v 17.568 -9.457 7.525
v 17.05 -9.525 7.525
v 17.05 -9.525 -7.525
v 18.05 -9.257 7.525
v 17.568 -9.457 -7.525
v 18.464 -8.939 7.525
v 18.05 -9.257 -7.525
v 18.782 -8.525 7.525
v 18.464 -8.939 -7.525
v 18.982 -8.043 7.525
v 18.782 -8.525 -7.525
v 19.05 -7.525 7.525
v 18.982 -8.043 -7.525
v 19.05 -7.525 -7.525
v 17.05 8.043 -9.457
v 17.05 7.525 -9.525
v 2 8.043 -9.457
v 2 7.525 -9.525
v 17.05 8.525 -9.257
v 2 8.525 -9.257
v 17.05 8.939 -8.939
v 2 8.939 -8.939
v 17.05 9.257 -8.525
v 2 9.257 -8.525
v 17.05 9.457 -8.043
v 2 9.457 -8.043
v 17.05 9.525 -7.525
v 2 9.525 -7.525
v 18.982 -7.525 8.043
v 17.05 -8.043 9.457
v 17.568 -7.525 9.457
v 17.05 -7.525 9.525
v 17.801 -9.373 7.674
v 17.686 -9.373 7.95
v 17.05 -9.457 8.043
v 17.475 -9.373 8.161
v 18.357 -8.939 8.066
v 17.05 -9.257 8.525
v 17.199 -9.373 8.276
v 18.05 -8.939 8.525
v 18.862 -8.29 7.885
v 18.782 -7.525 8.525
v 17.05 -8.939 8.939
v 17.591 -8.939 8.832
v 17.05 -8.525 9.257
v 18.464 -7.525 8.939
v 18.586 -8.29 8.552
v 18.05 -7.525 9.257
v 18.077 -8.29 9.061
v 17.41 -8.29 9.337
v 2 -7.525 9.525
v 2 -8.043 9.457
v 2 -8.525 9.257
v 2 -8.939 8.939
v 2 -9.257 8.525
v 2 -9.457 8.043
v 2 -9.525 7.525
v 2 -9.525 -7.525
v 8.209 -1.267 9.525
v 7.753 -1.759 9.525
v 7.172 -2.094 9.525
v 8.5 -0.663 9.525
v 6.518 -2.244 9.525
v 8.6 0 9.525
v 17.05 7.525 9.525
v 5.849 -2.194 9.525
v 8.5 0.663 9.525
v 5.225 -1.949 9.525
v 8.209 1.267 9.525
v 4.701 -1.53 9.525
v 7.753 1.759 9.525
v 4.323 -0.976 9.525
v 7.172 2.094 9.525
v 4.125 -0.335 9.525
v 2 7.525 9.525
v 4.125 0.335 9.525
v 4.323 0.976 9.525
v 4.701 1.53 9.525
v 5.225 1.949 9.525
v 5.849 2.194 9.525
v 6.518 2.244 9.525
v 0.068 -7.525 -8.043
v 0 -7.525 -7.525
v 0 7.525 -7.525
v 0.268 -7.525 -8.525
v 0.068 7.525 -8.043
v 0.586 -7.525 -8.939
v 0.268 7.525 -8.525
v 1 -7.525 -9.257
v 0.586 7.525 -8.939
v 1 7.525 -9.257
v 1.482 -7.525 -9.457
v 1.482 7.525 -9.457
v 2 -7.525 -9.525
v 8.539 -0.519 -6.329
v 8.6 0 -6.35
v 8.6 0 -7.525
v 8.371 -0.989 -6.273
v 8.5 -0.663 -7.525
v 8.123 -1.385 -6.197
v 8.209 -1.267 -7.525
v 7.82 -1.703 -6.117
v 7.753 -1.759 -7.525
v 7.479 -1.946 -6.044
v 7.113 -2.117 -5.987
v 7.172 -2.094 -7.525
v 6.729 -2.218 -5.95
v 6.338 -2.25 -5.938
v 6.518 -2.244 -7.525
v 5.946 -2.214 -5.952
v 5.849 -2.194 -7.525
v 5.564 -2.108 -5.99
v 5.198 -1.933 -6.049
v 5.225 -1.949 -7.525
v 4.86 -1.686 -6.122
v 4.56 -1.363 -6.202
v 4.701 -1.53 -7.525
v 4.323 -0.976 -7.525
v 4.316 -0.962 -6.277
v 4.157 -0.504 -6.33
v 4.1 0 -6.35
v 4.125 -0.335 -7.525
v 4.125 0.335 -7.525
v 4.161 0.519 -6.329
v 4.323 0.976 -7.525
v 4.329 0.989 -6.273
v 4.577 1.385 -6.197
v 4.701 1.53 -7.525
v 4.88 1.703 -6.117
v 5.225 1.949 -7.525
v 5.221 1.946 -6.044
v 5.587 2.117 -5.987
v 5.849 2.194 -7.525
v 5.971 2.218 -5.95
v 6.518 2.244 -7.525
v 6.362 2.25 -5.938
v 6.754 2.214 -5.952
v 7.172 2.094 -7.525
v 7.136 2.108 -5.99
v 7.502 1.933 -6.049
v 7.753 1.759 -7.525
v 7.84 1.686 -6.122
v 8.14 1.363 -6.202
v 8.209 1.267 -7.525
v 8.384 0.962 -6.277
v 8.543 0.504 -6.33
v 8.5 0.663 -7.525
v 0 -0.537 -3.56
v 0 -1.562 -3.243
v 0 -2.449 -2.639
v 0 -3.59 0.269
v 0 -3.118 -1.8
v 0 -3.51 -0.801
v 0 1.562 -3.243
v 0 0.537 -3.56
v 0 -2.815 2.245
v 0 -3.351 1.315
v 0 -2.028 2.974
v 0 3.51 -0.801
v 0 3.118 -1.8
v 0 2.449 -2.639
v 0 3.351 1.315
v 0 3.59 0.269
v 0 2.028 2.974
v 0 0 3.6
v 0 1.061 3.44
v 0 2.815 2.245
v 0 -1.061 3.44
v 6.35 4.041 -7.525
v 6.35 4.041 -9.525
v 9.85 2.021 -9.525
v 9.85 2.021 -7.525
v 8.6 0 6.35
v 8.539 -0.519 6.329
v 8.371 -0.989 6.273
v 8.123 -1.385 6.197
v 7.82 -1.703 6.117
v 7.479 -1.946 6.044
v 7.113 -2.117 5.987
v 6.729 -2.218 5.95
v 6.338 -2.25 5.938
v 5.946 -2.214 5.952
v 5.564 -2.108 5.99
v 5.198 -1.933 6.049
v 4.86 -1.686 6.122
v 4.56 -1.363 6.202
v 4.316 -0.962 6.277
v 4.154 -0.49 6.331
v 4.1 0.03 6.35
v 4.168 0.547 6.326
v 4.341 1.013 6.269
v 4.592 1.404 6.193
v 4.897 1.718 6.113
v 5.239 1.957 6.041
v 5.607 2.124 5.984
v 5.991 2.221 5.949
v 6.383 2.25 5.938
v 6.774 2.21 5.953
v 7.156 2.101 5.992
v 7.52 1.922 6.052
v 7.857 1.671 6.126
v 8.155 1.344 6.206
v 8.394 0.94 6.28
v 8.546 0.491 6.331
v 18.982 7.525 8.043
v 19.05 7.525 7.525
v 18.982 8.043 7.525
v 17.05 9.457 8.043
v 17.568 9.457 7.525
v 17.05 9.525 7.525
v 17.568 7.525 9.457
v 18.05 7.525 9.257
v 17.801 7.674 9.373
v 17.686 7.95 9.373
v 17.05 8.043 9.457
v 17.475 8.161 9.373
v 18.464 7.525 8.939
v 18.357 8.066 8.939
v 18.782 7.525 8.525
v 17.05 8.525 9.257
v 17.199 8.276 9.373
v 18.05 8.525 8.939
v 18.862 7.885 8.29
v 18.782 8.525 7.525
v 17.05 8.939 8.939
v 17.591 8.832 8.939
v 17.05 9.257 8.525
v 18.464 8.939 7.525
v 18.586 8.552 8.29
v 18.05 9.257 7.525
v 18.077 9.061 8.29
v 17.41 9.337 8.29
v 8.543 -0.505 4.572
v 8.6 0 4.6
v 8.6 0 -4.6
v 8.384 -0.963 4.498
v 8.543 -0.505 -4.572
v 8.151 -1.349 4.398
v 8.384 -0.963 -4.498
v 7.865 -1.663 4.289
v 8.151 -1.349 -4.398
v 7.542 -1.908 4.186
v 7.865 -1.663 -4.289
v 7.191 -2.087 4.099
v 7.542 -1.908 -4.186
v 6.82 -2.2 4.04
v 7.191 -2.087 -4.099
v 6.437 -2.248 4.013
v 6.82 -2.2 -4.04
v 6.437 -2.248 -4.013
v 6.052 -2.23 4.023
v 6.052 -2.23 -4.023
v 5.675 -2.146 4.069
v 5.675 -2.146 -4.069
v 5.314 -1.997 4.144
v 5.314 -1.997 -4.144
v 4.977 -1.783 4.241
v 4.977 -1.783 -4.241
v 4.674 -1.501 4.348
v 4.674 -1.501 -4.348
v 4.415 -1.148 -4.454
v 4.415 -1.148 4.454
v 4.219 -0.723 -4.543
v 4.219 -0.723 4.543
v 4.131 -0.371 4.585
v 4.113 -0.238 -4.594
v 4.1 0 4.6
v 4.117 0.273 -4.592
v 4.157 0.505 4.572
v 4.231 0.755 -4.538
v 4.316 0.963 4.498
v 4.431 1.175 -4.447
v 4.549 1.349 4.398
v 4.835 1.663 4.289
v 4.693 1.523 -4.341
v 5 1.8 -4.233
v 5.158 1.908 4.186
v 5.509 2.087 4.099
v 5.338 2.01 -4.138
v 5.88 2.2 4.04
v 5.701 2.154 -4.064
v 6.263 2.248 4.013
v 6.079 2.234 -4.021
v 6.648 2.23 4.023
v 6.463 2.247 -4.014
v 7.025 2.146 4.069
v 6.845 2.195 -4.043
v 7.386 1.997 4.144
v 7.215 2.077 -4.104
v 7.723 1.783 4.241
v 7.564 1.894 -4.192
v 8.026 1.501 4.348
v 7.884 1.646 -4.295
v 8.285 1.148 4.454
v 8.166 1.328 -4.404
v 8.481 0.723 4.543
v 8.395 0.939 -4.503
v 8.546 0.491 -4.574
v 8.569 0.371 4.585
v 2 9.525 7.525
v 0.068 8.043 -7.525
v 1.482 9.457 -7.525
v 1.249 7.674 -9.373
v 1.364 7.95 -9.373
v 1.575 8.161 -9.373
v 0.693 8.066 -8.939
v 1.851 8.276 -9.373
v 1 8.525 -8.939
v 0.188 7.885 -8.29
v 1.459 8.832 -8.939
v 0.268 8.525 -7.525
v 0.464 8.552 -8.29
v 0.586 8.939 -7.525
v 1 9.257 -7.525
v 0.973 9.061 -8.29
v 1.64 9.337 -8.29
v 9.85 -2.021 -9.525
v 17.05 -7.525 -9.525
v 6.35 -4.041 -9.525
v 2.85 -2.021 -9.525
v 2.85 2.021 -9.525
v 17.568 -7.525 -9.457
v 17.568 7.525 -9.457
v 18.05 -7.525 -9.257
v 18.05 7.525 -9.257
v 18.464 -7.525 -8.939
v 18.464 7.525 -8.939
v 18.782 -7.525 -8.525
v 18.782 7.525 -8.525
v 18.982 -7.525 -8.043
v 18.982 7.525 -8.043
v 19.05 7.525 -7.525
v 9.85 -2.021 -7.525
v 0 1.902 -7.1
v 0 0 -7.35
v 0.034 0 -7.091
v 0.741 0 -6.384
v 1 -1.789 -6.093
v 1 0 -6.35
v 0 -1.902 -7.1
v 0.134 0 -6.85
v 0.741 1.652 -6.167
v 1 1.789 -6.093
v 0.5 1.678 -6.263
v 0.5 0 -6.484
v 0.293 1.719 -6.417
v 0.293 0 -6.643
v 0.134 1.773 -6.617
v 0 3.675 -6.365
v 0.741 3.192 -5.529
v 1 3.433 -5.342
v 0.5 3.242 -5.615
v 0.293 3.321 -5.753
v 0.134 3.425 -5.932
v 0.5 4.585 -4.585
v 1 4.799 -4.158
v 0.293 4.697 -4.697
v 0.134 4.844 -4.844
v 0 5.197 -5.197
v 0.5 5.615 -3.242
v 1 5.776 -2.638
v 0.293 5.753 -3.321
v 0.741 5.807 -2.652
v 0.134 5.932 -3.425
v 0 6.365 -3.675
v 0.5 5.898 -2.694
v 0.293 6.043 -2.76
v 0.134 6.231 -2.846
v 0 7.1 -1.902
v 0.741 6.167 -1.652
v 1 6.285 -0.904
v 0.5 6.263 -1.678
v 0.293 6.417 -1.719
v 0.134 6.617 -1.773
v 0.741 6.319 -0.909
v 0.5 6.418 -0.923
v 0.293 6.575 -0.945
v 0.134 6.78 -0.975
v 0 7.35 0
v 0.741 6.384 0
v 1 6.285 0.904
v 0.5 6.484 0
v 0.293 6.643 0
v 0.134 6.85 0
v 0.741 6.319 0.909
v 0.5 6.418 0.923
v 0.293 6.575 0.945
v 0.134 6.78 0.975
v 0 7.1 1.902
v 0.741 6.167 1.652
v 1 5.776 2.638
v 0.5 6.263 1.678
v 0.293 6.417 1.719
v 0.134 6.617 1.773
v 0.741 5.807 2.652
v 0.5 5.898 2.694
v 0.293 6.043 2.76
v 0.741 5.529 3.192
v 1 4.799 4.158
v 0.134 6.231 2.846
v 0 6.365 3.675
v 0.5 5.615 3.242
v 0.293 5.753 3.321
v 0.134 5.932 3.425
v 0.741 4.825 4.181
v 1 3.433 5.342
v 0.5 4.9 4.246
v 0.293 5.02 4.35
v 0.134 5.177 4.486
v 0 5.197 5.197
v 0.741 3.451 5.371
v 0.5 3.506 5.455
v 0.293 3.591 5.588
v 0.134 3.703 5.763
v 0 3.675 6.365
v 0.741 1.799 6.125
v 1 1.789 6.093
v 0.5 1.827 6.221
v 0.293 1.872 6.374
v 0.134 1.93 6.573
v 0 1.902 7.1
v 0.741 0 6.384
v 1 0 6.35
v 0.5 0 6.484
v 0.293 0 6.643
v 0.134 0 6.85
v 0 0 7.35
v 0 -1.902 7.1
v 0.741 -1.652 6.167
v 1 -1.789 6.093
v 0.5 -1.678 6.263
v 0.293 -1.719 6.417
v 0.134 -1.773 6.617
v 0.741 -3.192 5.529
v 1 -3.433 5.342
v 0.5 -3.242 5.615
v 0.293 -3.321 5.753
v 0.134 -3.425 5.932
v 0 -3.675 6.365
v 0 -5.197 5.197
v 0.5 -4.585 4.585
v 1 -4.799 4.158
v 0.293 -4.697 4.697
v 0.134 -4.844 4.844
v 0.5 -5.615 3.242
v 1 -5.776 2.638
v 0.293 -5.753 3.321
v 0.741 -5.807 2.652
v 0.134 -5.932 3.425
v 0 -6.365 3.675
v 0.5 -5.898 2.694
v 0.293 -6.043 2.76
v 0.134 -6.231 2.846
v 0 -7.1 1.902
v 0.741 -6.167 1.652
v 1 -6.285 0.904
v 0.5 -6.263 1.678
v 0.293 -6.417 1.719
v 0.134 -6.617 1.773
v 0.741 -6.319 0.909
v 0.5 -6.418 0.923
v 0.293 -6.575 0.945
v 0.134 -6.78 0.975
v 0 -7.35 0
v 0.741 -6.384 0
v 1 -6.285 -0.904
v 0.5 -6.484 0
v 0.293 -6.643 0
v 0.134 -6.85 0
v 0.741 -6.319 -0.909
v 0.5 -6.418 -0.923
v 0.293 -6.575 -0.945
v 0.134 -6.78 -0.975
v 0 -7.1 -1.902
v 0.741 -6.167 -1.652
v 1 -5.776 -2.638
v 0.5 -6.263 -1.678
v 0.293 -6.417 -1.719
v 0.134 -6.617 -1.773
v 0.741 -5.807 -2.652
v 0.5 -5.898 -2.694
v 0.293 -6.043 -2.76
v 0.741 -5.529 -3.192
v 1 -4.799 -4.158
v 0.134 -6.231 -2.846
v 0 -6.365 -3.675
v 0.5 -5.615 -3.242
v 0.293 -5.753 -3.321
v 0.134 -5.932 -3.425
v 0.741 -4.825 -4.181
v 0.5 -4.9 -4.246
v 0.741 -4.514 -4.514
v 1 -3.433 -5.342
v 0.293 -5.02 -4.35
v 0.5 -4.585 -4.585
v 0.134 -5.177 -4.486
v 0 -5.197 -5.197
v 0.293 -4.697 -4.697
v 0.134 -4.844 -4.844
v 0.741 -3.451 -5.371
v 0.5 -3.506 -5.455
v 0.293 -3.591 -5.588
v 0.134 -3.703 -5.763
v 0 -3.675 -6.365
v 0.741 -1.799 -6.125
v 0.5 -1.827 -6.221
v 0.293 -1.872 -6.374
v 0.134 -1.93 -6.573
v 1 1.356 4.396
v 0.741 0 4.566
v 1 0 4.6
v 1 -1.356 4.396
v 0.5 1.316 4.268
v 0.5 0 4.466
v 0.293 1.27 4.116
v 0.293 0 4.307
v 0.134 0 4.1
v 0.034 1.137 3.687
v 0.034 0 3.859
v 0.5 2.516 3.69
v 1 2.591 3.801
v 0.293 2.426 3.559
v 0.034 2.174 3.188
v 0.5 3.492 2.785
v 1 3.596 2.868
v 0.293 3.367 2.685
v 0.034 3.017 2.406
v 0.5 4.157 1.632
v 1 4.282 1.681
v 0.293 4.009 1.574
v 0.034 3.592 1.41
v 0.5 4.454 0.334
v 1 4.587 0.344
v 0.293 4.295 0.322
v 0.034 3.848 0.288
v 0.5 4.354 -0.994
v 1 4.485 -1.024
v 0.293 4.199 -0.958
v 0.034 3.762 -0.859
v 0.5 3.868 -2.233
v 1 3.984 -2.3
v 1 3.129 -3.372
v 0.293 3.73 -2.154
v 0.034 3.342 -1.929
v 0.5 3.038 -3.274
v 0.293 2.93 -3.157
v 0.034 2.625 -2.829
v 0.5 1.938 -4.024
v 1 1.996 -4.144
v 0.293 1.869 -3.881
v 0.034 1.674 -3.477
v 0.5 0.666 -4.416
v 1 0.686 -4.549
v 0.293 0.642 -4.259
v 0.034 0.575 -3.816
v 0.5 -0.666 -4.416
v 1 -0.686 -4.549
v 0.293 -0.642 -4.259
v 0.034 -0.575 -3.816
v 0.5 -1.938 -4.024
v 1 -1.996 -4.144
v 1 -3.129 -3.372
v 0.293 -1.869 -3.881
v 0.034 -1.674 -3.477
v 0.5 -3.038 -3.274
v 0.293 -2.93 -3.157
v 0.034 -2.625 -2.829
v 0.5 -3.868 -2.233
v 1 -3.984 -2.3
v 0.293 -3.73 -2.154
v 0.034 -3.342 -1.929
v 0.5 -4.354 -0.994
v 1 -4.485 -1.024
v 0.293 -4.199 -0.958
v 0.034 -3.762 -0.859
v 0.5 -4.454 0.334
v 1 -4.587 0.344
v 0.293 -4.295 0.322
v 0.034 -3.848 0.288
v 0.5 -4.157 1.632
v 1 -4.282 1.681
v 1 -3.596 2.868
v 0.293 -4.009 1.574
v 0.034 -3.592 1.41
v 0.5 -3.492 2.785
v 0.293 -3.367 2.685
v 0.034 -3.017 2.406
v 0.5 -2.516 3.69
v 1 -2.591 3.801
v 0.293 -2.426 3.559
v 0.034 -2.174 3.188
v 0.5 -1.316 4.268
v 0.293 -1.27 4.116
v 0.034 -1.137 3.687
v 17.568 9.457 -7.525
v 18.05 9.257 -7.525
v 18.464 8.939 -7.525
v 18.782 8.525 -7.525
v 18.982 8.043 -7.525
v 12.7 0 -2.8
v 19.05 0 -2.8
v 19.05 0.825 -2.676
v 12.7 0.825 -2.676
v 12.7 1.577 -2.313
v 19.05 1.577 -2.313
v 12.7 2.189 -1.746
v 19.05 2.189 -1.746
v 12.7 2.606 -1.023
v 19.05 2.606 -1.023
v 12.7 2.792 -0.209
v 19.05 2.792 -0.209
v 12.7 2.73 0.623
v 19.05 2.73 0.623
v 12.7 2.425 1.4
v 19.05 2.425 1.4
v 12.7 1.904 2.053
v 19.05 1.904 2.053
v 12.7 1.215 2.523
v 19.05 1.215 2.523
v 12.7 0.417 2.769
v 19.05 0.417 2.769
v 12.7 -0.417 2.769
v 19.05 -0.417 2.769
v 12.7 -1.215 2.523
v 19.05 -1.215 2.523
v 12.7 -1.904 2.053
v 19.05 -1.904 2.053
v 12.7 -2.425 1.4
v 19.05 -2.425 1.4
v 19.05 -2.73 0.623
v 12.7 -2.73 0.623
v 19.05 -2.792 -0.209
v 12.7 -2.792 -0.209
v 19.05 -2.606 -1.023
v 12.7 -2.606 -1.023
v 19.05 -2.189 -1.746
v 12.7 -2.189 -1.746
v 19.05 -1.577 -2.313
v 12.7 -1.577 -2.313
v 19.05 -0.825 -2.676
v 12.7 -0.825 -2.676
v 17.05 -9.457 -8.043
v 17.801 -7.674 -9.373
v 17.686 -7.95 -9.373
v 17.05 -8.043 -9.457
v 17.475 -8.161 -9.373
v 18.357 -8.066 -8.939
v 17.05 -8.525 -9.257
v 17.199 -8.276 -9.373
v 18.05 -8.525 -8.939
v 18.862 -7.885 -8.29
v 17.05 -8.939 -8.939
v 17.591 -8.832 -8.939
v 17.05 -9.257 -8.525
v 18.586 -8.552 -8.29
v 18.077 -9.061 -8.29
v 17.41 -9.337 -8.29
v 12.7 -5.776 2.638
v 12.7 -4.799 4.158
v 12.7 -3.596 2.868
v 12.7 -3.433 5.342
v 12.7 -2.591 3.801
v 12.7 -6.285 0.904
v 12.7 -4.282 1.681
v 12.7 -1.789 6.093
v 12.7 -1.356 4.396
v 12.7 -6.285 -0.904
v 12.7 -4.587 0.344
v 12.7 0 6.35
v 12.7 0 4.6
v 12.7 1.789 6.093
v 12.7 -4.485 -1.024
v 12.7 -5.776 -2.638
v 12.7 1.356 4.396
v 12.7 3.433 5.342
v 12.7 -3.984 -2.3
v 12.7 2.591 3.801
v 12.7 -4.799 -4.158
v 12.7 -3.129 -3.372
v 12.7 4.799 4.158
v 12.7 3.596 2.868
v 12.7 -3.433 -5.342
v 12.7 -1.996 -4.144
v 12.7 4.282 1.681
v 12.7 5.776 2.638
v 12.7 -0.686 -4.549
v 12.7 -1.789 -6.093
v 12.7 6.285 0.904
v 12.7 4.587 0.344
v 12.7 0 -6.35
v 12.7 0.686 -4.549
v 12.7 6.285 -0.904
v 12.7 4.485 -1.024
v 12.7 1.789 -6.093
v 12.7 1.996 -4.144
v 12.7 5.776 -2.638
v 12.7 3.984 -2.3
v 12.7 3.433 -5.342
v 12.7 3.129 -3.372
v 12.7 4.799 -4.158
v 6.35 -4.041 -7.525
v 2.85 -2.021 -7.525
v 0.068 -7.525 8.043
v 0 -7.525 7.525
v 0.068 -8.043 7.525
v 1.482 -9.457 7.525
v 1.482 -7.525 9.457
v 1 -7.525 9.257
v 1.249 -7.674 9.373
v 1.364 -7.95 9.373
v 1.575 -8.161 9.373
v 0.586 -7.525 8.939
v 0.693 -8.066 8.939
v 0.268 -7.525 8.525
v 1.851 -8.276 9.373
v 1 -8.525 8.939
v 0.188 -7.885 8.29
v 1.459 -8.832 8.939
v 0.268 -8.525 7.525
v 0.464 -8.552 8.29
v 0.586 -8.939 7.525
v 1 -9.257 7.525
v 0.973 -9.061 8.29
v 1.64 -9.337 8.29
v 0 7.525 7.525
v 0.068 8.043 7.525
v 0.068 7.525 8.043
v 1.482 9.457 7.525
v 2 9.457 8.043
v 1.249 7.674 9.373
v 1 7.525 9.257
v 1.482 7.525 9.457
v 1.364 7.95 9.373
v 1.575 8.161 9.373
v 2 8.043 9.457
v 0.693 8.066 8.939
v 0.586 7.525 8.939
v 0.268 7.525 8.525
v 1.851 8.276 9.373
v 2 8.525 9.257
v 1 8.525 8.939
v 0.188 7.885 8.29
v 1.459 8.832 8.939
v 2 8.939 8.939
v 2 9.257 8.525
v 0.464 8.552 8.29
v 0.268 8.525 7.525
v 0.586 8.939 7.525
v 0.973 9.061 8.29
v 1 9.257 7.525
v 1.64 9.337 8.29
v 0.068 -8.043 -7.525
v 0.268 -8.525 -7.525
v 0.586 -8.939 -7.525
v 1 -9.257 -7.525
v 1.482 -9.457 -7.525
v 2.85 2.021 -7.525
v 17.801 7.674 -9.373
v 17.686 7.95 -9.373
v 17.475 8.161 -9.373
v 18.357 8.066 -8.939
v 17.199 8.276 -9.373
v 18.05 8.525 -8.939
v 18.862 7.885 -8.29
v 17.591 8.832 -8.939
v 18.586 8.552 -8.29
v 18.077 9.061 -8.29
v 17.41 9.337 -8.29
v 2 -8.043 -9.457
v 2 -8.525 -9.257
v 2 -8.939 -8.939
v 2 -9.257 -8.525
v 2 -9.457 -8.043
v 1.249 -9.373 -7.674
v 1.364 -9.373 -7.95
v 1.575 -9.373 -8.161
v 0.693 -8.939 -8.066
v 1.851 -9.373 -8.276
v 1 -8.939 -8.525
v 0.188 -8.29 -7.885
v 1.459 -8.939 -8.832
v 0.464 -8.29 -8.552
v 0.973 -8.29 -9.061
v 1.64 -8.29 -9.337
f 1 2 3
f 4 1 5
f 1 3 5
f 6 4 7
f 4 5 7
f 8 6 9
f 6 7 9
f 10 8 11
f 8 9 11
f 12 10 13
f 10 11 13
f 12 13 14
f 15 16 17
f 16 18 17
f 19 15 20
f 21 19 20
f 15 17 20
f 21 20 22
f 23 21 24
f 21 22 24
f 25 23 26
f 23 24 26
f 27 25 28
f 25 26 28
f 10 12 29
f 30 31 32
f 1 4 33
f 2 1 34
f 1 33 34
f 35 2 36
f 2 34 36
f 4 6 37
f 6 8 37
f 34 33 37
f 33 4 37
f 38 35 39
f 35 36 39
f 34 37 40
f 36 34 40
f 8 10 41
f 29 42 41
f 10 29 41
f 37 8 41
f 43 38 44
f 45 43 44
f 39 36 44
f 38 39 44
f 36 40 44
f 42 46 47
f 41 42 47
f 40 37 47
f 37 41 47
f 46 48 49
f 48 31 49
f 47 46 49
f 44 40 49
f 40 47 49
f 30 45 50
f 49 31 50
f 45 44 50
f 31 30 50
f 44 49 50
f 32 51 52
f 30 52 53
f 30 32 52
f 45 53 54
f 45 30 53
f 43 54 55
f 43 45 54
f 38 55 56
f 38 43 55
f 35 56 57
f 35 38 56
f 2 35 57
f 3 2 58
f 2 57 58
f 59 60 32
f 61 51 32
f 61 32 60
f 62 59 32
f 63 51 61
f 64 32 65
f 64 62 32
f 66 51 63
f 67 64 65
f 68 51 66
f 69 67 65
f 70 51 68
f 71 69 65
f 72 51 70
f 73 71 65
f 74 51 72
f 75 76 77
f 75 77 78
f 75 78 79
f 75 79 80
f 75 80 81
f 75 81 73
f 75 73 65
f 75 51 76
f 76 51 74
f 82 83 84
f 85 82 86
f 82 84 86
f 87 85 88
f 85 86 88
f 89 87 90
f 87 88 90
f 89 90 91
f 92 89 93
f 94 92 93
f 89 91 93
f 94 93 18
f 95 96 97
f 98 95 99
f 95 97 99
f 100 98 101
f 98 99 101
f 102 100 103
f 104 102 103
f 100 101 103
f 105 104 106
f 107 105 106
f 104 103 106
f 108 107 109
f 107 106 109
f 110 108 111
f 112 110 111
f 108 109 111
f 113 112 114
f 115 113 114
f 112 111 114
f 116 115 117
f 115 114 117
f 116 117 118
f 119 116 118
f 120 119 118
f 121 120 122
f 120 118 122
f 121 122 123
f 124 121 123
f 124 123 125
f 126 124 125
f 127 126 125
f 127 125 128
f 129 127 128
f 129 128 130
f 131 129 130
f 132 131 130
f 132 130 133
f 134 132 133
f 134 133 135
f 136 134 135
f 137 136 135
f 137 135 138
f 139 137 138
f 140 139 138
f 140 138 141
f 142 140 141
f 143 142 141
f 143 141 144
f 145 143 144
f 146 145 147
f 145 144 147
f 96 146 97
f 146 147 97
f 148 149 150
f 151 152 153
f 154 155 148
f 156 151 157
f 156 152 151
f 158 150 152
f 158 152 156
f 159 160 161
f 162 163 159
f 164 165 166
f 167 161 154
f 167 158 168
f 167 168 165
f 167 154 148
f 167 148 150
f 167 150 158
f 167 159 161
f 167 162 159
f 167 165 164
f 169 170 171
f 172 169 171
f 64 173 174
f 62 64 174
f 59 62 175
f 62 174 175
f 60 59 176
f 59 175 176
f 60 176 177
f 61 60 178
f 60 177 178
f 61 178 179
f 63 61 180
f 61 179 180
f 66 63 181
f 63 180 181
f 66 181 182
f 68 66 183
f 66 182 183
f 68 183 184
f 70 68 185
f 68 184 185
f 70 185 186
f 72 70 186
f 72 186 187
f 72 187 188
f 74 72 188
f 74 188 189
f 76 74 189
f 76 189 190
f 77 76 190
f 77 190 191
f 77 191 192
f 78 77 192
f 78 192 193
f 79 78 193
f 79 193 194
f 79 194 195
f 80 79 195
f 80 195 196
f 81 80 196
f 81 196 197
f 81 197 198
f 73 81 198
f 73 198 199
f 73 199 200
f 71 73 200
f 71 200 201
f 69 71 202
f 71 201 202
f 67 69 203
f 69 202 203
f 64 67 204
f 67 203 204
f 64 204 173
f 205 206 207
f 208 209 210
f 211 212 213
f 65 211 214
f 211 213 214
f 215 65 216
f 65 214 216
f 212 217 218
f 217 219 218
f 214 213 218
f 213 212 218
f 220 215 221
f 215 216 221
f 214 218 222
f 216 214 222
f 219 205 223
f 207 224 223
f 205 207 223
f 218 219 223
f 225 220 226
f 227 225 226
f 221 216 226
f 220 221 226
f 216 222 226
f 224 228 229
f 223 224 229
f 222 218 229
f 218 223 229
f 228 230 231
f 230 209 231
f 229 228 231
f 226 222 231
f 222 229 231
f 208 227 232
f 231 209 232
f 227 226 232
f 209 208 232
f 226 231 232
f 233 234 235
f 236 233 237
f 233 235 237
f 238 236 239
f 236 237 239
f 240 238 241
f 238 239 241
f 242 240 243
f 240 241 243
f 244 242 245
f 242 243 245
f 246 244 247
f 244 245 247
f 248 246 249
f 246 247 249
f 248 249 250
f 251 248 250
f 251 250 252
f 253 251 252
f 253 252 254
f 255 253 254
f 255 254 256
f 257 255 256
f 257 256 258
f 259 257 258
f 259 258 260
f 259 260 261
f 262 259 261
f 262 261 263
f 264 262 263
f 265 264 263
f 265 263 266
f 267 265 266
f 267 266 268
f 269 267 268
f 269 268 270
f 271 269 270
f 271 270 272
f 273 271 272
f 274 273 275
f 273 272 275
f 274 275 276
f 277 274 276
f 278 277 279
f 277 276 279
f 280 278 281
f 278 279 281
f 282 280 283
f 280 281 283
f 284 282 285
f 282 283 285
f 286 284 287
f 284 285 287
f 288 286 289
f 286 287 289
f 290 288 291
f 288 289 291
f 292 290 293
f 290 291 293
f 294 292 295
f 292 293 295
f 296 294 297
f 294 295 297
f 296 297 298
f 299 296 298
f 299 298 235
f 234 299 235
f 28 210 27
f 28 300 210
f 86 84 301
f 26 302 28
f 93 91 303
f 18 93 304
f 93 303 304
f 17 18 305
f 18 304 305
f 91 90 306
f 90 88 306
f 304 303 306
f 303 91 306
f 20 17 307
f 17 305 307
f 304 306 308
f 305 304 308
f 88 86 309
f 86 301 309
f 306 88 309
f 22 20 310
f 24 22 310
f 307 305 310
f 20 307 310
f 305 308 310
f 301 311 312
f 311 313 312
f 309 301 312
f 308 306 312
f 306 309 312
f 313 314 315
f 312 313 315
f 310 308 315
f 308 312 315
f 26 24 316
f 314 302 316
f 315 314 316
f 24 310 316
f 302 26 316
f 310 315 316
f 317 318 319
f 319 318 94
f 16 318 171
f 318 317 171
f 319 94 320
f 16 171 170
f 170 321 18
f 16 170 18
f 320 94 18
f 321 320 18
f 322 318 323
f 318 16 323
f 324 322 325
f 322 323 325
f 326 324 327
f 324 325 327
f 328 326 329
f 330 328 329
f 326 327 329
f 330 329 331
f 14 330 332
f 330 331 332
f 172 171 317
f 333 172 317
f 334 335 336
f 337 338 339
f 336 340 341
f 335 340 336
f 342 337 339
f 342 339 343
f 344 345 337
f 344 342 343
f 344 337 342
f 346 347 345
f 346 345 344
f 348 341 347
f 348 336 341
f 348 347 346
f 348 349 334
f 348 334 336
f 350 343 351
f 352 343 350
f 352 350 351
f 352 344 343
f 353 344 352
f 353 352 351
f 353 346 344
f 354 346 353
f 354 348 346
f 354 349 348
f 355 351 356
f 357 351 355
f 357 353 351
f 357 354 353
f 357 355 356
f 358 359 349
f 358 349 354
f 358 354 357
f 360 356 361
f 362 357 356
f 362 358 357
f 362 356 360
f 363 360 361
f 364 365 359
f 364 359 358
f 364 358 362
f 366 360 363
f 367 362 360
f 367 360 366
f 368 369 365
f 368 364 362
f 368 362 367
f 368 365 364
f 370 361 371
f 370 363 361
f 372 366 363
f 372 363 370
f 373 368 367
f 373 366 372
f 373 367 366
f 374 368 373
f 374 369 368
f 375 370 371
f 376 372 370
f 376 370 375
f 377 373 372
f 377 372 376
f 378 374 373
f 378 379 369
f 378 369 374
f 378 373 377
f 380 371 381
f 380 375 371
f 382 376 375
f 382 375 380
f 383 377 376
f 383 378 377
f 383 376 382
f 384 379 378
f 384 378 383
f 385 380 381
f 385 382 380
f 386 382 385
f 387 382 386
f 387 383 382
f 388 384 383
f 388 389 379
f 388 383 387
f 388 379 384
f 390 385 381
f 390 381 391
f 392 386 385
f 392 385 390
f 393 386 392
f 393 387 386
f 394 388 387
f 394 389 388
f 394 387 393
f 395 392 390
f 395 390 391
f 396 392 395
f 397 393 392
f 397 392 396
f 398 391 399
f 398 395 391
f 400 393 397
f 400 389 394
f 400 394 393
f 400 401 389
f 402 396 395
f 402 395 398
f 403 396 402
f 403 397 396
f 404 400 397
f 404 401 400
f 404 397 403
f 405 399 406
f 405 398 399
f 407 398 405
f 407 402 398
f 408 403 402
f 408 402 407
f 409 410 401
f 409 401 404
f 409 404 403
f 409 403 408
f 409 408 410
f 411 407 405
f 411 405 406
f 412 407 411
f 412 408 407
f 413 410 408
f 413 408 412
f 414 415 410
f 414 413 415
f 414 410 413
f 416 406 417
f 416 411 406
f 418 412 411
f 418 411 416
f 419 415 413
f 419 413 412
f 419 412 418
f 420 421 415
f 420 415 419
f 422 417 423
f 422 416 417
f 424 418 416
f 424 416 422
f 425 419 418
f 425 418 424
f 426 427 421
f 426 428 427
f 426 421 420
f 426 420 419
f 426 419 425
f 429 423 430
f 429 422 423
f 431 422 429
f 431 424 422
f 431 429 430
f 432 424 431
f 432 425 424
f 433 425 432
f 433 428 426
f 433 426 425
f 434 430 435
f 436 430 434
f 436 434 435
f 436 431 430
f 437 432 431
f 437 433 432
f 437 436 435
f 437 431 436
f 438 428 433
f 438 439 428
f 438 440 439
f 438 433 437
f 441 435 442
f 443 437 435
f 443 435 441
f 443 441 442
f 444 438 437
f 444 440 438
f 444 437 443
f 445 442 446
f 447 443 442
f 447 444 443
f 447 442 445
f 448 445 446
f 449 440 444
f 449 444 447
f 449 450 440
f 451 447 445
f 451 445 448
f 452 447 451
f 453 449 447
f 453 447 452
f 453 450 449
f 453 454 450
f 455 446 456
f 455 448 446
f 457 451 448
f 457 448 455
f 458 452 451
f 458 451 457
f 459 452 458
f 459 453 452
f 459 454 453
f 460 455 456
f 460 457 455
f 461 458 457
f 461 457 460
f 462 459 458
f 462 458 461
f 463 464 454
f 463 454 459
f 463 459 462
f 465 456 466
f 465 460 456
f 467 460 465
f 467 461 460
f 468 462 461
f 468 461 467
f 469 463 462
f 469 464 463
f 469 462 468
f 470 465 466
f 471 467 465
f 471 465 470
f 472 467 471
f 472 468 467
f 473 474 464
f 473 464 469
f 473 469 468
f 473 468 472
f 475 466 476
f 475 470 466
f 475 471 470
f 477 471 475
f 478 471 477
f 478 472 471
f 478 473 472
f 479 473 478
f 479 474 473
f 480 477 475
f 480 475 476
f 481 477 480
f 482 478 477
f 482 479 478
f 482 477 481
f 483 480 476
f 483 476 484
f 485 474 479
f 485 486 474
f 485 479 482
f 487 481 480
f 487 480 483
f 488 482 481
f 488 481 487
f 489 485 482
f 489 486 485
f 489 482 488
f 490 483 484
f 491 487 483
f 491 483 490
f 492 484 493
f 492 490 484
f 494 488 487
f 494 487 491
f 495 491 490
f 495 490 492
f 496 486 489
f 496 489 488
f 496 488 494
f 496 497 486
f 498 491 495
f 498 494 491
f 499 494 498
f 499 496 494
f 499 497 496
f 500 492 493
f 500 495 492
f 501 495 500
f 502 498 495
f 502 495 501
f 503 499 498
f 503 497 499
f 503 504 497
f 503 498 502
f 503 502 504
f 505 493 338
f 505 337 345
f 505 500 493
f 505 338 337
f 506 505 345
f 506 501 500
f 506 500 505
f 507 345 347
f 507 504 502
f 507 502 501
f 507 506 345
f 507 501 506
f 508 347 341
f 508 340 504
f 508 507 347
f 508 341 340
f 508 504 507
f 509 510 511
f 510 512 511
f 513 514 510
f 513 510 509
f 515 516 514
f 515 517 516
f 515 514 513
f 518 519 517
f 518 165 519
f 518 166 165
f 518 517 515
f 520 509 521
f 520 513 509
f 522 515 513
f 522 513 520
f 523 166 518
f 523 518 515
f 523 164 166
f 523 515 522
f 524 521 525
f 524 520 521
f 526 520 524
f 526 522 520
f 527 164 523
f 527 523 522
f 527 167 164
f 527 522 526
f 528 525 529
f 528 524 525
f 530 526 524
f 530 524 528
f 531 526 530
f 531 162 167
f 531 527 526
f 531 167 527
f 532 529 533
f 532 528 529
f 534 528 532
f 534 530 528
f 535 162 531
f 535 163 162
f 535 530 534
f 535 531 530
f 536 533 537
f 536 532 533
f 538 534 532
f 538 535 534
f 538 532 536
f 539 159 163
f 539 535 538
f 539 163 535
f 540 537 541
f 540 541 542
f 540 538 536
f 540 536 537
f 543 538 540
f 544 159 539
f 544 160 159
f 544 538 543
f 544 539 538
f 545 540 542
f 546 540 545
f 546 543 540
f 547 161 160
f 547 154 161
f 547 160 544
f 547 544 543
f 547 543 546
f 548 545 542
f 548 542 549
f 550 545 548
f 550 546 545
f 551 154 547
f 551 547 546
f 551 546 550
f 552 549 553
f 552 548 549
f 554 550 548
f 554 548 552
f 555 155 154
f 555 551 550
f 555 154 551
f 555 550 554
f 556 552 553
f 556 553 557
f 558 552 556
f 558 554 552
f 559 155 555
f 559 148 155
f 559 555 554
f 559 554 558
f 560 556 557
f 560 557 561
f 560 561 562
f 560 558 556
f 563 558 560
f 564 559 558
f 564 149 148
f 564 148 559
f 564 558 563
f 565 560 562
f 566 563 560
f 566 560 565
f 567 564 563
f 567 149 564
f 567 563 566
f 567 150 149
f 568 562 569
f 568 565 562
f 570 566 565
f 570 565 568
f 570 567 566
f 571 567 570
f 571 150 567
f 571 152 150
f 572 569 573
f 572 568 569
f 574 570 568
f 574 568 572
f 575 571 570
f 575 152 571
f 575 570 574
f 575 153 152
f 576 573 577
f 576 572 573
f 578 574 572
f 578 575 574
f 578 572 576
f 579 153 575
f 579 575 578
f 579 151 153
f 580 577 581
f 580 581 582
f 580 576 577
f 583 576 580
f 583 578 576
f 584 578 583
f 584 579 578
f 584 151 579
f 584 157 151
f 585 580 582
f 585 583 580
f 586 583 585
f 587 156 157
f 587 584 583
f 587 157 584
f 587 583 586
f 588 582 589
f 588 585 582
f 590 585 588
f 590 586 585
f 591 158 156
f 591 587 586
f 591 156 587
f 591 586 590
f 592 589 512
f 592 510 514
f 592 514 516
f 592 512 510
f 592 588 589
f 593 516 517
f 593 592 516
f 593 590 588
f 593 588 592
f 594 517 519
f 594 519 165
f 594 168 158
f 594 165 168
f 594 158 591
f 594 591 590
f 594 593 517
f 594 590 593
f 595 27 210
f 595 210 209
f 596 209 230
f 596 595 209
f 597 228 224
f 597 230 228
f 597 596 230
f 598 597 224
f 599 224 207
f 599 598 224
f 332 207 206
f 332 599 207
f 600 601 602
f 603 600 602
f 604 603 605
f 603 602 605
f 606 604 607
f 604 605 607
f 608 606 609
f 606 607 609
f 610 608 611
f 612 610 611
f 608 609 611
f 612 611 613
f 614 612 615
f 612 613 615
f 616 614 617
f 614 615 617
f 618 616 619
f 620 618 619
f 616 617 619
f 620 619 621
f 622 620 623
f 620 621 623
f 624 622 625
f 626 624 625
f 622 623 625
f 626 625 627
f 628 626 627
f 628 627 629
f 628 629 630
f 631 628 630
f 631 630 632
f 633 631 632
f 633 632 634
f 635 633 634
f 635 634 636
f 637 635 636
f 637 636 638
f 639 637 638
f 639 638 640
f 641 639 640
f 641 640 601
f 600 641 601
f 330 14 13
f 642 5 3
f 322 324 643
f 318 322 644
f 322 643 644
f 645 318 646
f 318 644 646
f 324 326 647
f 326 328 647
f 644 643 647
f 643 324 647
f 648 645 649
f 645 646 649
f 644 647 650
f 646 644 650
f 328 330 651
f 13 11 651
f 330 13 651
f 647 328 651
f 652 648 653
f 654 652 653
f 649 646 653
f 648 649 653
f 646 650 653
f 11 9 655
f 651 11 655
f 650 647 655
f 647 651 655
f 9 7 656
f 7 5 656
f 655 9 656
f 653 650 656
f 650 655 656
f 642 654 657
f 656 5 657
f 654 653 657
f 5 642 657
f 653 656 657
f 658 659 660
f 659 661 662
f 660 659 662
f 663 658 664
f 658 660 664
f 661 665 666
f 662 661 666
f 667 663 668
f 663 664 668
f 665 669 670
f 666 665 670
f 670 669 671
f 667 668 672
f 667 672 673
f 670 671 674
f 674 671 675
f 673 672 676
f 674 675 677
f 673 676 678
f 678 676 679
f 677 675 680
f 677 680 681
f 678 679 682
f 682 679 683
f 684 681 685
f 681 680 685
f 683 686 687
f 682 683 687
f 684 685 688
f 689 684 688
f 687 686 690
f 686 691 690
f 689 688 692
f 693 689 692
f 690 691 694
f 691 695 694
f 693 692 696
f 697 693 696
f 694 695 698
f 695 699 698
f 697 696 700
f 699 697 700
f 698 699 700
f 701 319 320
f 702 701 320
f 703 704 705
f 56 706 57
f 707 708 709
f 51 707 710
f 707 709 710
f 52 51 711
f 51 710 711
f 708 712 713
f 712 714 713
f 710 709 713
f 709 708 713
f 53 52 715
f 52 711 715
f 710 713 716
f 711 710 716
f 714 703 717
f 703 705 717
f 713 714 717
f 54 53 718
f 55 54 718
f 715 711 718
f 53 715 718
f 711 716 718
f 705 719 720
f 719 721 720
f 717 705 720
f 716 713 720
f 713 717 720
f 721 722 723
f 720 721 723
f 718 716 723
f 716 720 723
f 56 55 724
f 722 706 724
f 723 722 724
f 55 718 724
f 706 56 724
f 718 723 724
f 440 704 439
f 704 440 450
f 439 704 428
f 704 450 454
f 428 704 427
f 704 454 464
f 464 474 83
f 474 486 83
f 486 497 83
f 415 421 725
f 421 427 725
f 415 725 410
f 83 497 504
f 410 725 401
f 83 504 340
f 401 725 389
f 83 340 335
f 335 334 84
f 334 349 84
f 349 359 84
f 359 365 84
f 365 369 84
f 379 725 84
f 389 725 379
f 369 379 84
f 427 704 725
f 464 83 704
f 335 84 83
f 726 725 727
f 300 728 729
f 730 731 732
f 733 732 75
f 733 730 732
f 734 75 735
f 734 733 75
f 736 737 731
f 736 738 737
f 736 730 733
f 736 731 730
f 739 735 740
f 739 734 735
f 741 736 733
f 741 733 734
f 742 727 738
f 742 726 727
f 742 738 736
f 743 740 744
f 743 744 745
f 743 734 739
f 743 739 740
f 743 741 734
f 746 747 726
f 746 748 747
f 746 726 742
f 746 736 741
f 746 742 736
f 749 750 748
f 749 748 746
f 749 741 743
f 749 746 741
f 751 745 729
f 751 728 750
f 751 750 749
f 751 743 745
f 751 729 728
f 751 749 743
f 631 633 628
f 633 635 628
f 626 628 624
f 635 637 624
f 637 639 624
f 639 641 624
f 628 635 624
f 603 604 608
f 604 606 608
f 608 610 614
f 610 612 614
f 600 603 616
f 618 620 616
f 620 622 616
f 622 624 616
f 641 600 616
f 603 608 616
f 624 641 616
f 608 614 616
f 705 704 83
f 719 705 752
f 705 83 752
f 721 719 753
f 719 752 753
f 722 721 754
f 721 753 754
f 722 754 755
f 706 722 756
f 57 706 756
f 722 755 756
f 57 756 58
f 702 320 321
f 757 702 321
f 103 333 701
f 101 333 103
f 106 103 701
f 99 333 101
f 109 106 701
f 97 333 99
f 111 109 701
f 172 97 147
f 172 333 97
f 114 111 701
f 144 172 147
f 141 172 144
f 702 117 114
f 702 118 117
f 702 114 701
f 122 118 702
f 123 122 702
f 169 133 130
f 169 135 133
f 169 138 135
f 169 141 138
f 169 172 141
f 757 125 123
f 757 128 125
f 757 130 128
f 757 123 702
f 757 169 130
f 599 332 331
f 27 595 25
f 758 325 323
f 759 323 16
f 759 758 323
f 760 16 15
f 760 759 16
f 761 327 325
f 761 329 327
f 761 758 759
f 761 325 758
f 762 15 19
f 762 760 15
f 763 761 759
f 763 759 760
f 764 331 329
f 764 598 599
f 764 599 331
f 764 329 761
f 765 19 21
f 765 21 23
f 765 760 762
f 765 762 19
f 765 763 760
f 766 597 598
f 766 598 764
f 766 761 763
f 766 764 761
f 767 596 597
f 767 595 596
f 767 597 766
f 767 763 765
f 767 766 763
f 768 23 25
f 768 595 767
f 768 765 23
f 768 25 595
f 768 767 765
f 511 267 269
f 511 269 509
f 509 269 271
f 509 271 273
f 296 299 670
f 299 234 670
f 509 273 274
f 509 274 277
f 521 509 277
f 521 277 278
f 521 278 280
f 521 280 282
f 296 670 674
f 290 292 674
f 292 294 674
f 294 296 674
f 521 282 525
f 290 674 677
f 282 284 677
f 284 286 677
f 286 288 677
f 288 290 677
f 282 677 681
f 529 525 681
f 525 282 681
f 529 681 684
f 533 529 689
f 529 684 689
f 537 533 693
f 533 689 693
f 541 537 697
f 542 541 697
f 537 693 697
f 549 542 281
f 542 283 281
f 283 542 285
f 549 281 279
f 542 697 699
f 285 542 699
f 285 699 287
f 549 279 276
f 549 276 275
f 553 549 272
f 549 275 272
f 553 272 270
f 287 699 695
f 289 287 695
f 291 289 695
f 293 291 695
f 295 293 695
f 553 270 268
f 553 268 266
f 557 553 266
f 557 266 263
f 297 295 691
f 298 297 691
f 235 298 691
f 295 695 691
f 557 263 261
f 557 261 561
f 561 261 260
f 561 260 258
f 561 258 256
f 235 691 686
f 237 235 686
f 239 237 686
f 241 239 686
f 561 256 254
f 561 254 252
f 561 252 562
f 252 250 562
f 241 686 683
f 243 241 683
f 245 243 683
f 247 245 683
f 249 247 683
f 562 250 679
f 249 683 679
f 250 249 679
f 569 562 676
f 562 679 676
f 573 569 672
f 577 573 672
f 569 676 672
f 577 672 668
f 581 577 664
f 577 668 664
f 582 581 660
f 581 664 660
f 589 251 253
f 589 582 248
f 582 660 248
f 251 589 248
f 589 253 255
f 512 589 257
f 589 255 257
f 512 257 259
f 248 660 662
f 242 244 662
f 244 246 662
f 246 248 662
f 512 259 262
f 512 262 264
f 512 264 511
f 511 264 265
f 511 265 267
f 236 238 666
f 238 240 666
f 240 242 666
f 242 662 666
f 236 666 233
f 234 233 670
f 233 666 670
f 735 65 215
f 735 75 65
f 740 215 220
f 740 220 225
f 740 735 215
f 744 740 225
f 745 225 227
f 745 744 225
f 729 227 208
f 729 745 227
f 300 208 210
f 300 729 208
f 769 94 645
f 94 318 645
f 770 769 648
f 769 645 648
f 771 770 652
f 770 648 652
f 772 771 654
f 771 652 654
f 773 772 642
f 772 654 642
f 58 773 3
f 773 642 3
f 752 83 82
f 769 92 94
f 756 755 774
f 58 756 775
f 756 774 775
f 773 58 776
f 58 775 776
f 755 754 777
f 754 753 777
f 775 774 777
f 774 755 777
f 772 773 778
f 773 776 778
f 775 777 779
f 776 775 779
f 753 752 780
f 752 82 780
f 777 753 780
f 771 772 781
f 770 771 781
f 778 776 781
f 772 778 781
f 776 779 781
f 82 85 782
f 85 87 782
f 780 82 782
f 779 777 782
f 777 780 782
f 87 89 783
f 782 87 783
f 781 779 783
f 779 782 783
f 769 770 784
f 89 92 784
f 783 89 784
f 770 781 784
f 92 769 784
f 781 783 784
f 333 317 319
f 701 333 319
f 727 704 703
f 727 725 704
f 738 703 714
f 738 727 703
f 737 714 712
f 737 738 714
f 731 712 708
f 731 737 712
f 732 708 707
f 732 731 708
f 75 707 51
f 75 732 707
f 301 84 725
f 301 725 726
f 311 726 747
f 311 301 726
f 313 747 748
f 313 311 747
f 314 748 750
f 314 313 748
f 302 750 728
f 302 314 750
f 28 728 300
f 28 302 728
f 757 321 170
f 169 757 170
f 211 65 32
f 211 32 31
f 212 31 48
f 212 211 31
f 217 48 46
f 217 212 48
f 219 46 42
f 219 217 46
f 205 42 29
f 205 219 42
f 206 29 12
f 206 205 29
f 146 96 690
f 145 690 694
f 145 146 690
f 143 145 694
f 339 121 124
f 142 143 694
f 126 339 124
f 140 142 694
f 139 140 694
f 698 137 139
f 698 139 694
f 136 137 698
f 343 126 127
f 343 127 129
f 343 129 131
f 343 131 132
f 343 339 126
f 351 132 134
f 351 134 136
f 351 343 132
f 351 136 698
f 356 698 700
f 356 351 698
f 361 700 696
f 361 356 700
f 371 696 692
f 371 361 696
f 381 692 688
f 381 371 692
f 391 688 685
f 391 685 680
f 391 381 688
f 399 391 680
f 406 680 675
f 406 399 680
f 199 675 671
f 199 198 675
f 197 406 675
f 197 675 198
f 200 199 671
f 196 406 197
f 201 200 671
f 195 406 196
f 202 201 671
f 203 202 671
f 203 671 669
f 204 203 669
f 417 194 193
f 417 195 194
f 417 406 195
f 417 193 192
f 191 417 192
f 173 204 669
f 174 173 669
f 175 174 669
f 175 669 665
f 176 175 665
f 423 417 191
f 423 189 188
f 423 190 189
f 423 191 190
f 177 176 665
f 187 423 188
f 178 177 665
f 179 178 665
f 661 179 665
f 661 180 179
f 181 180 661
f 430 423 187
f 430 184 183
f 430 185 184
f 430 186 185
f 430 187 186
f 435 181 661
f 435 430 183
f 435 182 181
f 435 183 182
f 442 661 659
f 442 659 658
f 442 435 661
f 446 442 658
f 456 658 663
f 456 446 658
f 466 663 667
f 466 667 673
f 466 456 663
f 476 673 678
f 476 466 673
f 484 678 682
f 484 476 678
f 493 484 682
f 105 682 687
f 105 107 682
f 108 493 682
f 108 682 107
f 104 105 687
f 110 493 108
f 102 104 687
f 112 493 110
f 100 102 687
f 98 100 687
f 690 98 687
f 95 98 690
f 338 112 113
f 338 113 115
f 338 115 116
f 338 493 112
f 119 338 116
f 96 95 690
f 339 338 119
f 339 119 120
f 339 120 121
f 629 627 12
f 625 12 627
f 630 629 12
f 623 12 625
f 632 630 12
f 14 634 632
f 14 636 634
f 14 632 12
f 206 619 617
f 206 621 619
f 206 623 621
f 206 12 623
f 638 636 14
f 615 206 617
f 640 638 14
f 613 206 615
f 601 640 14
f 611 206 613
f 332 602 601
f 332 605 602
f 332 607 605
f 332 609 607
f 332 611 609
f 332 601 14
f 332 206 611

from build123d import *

# Parameters (mm, degrees)
SKETCH1_W           = 19.05
SKETCH1_H           = 19.05
SKETCH1_R           = 6.35
BOSS_EXTRUDE1_DEPTH = 12.7
SKETCH3_W           = 19.05
SKETCH3_H           = 19.05
BOSS_EXTRUDE2_DEPTH = 6.35
SKETCH5_R           = 2.8
CUT_EXTRUDE1_DEPTH  = 7
SKETCH6_R           = 4.6
BOSS_EXTRUDE4_DEPTH = 12.7
CUT_EXTRUDE2_DEPTH  = 55
FILLET1_R           = 1
FILLET2_R           = 2
SKETCH9_R           = 2.25
CUT_EXTRUDE3_DEPTH  = 2


with BuildPart() as part:
    # Sketch1 → Boss-Extrude1 (new body)
    with BuildSketch(Plane(origin=(0, 0, 0), x_dir=(0, 0, -1), z_dir=(1, 0, 0))):
        Rectangle(SKETCH1_W, SKETCH1_H)
        Circle(SKETCH1_R, mode=Mode.SUBTRACT)
    extrude(amount=BOSS_EXTRUDE1_DEPTH)

    # Sketch3 → Boss-Extrude2 (add)
    with BuildSketch(Plane(origin=(12.7, 0, 0), x_dir=(0, 0, -1), z_dir=(1, 0, 0))):
        Rectangle(SKETCH3_W, SKETCH3_H)
    extrude(amount=BOSS_EXTRUDE2_DEPTH)

    # Sketch5 → Cut-Extrude1 (cut)
    with BuildSketch(Plane(origin=(19.05, 0, 0), x_dir=(0, 0, -1), z_dir=(1, 0, 0))):
        Circle(SKETCH5_R)
    extrude(amount=-CUT_EXTRUDE1_DEPTH, mode=Mode.SUBTRACT)

    # Sketch6 → Boss-Extrude4 (add)
    with BuildSketch(Plane.ZY.offset(-12.7)):
        Circle(SKETCH6_R)
    extrude(amount=BOSS_EXTRUDE4_DEPTH)

    # Sketch8 → Cut-Extrude2 (cut)
    with BuildSketch(Plane(origin=(0, 0, -9.525), x_dir=(-1, 0, 0), z_dir=(0, 0, -1))):
        with BuildLine():
            ThreePointArc((-4.1, 0), (-6.35, 2.25), (-8.6, 0))
            Line((-8.6, 0), (-4.1, 0))
        make_face()
        with BuildLine():
            Line((-4.1, 0), (-8.6, 0))
            ThreePointArc((-8.6, 0), (-6.35, -2.25), (-4.1, 0))
        make_face()
    extrude(amount=-CUT_EXTRUDE2_DEPTH, mode=Mode.SUBTRACT)

    # Fillet1
    fillet1_edges = [part.edges().sort_by_distance(p)[0] for p in [
        (0, 0, 6.35),
        (0, 0, -4.6),
    ]]
    fillet(fillet1_edges, radius=FILLET1_R)

    # Fillet2
    fillet2_edges = [part.edges().sort_by_distance(p)[0] for p in [
        (19.05, 9.525, 0),
        (19.05, 0, 9.525),
        (19.05, -9.525, 0),
        (19.05, 0, -9.525),
        (0, 9.525, 0),
        (0, 0, -9.525),
        (0, -9.525, 0),
        (0, 0, 9.525),
        (9.525, 9.525, 9.525),
        (9.525, 9.525, -9.525),
        (9.525, -9.525, -9.525),
        (9.525, -9.525, 9.525),
    ]]
    fillet(fillet2_edges, radius=FILLET2_R)

    # Sketch9 → Cut-Extrude3 (cut)
    with BuildSketch(Plane(origin=(0, 0, -9.525), x_dir=(-1, 0, 0), z_dir=(0, 0, -1))):
        Polygon((-9.85, 2.020725942), (-9.85, -2.020725942), (-6.35, -4.041451884), (-2.85, -2.020725942), (-2.85, 2.020725942), (-6.35, 4.041451884), align=None)
        with Locations((-6.35, 0)):
            Circle(SKETCH9_R, mode=Mode.SUBTRACT)
    extrude(amount=-CUT_EXTRUDE3_DEPTH, mode=Mode.SUBTRACT)


solid = part.part
